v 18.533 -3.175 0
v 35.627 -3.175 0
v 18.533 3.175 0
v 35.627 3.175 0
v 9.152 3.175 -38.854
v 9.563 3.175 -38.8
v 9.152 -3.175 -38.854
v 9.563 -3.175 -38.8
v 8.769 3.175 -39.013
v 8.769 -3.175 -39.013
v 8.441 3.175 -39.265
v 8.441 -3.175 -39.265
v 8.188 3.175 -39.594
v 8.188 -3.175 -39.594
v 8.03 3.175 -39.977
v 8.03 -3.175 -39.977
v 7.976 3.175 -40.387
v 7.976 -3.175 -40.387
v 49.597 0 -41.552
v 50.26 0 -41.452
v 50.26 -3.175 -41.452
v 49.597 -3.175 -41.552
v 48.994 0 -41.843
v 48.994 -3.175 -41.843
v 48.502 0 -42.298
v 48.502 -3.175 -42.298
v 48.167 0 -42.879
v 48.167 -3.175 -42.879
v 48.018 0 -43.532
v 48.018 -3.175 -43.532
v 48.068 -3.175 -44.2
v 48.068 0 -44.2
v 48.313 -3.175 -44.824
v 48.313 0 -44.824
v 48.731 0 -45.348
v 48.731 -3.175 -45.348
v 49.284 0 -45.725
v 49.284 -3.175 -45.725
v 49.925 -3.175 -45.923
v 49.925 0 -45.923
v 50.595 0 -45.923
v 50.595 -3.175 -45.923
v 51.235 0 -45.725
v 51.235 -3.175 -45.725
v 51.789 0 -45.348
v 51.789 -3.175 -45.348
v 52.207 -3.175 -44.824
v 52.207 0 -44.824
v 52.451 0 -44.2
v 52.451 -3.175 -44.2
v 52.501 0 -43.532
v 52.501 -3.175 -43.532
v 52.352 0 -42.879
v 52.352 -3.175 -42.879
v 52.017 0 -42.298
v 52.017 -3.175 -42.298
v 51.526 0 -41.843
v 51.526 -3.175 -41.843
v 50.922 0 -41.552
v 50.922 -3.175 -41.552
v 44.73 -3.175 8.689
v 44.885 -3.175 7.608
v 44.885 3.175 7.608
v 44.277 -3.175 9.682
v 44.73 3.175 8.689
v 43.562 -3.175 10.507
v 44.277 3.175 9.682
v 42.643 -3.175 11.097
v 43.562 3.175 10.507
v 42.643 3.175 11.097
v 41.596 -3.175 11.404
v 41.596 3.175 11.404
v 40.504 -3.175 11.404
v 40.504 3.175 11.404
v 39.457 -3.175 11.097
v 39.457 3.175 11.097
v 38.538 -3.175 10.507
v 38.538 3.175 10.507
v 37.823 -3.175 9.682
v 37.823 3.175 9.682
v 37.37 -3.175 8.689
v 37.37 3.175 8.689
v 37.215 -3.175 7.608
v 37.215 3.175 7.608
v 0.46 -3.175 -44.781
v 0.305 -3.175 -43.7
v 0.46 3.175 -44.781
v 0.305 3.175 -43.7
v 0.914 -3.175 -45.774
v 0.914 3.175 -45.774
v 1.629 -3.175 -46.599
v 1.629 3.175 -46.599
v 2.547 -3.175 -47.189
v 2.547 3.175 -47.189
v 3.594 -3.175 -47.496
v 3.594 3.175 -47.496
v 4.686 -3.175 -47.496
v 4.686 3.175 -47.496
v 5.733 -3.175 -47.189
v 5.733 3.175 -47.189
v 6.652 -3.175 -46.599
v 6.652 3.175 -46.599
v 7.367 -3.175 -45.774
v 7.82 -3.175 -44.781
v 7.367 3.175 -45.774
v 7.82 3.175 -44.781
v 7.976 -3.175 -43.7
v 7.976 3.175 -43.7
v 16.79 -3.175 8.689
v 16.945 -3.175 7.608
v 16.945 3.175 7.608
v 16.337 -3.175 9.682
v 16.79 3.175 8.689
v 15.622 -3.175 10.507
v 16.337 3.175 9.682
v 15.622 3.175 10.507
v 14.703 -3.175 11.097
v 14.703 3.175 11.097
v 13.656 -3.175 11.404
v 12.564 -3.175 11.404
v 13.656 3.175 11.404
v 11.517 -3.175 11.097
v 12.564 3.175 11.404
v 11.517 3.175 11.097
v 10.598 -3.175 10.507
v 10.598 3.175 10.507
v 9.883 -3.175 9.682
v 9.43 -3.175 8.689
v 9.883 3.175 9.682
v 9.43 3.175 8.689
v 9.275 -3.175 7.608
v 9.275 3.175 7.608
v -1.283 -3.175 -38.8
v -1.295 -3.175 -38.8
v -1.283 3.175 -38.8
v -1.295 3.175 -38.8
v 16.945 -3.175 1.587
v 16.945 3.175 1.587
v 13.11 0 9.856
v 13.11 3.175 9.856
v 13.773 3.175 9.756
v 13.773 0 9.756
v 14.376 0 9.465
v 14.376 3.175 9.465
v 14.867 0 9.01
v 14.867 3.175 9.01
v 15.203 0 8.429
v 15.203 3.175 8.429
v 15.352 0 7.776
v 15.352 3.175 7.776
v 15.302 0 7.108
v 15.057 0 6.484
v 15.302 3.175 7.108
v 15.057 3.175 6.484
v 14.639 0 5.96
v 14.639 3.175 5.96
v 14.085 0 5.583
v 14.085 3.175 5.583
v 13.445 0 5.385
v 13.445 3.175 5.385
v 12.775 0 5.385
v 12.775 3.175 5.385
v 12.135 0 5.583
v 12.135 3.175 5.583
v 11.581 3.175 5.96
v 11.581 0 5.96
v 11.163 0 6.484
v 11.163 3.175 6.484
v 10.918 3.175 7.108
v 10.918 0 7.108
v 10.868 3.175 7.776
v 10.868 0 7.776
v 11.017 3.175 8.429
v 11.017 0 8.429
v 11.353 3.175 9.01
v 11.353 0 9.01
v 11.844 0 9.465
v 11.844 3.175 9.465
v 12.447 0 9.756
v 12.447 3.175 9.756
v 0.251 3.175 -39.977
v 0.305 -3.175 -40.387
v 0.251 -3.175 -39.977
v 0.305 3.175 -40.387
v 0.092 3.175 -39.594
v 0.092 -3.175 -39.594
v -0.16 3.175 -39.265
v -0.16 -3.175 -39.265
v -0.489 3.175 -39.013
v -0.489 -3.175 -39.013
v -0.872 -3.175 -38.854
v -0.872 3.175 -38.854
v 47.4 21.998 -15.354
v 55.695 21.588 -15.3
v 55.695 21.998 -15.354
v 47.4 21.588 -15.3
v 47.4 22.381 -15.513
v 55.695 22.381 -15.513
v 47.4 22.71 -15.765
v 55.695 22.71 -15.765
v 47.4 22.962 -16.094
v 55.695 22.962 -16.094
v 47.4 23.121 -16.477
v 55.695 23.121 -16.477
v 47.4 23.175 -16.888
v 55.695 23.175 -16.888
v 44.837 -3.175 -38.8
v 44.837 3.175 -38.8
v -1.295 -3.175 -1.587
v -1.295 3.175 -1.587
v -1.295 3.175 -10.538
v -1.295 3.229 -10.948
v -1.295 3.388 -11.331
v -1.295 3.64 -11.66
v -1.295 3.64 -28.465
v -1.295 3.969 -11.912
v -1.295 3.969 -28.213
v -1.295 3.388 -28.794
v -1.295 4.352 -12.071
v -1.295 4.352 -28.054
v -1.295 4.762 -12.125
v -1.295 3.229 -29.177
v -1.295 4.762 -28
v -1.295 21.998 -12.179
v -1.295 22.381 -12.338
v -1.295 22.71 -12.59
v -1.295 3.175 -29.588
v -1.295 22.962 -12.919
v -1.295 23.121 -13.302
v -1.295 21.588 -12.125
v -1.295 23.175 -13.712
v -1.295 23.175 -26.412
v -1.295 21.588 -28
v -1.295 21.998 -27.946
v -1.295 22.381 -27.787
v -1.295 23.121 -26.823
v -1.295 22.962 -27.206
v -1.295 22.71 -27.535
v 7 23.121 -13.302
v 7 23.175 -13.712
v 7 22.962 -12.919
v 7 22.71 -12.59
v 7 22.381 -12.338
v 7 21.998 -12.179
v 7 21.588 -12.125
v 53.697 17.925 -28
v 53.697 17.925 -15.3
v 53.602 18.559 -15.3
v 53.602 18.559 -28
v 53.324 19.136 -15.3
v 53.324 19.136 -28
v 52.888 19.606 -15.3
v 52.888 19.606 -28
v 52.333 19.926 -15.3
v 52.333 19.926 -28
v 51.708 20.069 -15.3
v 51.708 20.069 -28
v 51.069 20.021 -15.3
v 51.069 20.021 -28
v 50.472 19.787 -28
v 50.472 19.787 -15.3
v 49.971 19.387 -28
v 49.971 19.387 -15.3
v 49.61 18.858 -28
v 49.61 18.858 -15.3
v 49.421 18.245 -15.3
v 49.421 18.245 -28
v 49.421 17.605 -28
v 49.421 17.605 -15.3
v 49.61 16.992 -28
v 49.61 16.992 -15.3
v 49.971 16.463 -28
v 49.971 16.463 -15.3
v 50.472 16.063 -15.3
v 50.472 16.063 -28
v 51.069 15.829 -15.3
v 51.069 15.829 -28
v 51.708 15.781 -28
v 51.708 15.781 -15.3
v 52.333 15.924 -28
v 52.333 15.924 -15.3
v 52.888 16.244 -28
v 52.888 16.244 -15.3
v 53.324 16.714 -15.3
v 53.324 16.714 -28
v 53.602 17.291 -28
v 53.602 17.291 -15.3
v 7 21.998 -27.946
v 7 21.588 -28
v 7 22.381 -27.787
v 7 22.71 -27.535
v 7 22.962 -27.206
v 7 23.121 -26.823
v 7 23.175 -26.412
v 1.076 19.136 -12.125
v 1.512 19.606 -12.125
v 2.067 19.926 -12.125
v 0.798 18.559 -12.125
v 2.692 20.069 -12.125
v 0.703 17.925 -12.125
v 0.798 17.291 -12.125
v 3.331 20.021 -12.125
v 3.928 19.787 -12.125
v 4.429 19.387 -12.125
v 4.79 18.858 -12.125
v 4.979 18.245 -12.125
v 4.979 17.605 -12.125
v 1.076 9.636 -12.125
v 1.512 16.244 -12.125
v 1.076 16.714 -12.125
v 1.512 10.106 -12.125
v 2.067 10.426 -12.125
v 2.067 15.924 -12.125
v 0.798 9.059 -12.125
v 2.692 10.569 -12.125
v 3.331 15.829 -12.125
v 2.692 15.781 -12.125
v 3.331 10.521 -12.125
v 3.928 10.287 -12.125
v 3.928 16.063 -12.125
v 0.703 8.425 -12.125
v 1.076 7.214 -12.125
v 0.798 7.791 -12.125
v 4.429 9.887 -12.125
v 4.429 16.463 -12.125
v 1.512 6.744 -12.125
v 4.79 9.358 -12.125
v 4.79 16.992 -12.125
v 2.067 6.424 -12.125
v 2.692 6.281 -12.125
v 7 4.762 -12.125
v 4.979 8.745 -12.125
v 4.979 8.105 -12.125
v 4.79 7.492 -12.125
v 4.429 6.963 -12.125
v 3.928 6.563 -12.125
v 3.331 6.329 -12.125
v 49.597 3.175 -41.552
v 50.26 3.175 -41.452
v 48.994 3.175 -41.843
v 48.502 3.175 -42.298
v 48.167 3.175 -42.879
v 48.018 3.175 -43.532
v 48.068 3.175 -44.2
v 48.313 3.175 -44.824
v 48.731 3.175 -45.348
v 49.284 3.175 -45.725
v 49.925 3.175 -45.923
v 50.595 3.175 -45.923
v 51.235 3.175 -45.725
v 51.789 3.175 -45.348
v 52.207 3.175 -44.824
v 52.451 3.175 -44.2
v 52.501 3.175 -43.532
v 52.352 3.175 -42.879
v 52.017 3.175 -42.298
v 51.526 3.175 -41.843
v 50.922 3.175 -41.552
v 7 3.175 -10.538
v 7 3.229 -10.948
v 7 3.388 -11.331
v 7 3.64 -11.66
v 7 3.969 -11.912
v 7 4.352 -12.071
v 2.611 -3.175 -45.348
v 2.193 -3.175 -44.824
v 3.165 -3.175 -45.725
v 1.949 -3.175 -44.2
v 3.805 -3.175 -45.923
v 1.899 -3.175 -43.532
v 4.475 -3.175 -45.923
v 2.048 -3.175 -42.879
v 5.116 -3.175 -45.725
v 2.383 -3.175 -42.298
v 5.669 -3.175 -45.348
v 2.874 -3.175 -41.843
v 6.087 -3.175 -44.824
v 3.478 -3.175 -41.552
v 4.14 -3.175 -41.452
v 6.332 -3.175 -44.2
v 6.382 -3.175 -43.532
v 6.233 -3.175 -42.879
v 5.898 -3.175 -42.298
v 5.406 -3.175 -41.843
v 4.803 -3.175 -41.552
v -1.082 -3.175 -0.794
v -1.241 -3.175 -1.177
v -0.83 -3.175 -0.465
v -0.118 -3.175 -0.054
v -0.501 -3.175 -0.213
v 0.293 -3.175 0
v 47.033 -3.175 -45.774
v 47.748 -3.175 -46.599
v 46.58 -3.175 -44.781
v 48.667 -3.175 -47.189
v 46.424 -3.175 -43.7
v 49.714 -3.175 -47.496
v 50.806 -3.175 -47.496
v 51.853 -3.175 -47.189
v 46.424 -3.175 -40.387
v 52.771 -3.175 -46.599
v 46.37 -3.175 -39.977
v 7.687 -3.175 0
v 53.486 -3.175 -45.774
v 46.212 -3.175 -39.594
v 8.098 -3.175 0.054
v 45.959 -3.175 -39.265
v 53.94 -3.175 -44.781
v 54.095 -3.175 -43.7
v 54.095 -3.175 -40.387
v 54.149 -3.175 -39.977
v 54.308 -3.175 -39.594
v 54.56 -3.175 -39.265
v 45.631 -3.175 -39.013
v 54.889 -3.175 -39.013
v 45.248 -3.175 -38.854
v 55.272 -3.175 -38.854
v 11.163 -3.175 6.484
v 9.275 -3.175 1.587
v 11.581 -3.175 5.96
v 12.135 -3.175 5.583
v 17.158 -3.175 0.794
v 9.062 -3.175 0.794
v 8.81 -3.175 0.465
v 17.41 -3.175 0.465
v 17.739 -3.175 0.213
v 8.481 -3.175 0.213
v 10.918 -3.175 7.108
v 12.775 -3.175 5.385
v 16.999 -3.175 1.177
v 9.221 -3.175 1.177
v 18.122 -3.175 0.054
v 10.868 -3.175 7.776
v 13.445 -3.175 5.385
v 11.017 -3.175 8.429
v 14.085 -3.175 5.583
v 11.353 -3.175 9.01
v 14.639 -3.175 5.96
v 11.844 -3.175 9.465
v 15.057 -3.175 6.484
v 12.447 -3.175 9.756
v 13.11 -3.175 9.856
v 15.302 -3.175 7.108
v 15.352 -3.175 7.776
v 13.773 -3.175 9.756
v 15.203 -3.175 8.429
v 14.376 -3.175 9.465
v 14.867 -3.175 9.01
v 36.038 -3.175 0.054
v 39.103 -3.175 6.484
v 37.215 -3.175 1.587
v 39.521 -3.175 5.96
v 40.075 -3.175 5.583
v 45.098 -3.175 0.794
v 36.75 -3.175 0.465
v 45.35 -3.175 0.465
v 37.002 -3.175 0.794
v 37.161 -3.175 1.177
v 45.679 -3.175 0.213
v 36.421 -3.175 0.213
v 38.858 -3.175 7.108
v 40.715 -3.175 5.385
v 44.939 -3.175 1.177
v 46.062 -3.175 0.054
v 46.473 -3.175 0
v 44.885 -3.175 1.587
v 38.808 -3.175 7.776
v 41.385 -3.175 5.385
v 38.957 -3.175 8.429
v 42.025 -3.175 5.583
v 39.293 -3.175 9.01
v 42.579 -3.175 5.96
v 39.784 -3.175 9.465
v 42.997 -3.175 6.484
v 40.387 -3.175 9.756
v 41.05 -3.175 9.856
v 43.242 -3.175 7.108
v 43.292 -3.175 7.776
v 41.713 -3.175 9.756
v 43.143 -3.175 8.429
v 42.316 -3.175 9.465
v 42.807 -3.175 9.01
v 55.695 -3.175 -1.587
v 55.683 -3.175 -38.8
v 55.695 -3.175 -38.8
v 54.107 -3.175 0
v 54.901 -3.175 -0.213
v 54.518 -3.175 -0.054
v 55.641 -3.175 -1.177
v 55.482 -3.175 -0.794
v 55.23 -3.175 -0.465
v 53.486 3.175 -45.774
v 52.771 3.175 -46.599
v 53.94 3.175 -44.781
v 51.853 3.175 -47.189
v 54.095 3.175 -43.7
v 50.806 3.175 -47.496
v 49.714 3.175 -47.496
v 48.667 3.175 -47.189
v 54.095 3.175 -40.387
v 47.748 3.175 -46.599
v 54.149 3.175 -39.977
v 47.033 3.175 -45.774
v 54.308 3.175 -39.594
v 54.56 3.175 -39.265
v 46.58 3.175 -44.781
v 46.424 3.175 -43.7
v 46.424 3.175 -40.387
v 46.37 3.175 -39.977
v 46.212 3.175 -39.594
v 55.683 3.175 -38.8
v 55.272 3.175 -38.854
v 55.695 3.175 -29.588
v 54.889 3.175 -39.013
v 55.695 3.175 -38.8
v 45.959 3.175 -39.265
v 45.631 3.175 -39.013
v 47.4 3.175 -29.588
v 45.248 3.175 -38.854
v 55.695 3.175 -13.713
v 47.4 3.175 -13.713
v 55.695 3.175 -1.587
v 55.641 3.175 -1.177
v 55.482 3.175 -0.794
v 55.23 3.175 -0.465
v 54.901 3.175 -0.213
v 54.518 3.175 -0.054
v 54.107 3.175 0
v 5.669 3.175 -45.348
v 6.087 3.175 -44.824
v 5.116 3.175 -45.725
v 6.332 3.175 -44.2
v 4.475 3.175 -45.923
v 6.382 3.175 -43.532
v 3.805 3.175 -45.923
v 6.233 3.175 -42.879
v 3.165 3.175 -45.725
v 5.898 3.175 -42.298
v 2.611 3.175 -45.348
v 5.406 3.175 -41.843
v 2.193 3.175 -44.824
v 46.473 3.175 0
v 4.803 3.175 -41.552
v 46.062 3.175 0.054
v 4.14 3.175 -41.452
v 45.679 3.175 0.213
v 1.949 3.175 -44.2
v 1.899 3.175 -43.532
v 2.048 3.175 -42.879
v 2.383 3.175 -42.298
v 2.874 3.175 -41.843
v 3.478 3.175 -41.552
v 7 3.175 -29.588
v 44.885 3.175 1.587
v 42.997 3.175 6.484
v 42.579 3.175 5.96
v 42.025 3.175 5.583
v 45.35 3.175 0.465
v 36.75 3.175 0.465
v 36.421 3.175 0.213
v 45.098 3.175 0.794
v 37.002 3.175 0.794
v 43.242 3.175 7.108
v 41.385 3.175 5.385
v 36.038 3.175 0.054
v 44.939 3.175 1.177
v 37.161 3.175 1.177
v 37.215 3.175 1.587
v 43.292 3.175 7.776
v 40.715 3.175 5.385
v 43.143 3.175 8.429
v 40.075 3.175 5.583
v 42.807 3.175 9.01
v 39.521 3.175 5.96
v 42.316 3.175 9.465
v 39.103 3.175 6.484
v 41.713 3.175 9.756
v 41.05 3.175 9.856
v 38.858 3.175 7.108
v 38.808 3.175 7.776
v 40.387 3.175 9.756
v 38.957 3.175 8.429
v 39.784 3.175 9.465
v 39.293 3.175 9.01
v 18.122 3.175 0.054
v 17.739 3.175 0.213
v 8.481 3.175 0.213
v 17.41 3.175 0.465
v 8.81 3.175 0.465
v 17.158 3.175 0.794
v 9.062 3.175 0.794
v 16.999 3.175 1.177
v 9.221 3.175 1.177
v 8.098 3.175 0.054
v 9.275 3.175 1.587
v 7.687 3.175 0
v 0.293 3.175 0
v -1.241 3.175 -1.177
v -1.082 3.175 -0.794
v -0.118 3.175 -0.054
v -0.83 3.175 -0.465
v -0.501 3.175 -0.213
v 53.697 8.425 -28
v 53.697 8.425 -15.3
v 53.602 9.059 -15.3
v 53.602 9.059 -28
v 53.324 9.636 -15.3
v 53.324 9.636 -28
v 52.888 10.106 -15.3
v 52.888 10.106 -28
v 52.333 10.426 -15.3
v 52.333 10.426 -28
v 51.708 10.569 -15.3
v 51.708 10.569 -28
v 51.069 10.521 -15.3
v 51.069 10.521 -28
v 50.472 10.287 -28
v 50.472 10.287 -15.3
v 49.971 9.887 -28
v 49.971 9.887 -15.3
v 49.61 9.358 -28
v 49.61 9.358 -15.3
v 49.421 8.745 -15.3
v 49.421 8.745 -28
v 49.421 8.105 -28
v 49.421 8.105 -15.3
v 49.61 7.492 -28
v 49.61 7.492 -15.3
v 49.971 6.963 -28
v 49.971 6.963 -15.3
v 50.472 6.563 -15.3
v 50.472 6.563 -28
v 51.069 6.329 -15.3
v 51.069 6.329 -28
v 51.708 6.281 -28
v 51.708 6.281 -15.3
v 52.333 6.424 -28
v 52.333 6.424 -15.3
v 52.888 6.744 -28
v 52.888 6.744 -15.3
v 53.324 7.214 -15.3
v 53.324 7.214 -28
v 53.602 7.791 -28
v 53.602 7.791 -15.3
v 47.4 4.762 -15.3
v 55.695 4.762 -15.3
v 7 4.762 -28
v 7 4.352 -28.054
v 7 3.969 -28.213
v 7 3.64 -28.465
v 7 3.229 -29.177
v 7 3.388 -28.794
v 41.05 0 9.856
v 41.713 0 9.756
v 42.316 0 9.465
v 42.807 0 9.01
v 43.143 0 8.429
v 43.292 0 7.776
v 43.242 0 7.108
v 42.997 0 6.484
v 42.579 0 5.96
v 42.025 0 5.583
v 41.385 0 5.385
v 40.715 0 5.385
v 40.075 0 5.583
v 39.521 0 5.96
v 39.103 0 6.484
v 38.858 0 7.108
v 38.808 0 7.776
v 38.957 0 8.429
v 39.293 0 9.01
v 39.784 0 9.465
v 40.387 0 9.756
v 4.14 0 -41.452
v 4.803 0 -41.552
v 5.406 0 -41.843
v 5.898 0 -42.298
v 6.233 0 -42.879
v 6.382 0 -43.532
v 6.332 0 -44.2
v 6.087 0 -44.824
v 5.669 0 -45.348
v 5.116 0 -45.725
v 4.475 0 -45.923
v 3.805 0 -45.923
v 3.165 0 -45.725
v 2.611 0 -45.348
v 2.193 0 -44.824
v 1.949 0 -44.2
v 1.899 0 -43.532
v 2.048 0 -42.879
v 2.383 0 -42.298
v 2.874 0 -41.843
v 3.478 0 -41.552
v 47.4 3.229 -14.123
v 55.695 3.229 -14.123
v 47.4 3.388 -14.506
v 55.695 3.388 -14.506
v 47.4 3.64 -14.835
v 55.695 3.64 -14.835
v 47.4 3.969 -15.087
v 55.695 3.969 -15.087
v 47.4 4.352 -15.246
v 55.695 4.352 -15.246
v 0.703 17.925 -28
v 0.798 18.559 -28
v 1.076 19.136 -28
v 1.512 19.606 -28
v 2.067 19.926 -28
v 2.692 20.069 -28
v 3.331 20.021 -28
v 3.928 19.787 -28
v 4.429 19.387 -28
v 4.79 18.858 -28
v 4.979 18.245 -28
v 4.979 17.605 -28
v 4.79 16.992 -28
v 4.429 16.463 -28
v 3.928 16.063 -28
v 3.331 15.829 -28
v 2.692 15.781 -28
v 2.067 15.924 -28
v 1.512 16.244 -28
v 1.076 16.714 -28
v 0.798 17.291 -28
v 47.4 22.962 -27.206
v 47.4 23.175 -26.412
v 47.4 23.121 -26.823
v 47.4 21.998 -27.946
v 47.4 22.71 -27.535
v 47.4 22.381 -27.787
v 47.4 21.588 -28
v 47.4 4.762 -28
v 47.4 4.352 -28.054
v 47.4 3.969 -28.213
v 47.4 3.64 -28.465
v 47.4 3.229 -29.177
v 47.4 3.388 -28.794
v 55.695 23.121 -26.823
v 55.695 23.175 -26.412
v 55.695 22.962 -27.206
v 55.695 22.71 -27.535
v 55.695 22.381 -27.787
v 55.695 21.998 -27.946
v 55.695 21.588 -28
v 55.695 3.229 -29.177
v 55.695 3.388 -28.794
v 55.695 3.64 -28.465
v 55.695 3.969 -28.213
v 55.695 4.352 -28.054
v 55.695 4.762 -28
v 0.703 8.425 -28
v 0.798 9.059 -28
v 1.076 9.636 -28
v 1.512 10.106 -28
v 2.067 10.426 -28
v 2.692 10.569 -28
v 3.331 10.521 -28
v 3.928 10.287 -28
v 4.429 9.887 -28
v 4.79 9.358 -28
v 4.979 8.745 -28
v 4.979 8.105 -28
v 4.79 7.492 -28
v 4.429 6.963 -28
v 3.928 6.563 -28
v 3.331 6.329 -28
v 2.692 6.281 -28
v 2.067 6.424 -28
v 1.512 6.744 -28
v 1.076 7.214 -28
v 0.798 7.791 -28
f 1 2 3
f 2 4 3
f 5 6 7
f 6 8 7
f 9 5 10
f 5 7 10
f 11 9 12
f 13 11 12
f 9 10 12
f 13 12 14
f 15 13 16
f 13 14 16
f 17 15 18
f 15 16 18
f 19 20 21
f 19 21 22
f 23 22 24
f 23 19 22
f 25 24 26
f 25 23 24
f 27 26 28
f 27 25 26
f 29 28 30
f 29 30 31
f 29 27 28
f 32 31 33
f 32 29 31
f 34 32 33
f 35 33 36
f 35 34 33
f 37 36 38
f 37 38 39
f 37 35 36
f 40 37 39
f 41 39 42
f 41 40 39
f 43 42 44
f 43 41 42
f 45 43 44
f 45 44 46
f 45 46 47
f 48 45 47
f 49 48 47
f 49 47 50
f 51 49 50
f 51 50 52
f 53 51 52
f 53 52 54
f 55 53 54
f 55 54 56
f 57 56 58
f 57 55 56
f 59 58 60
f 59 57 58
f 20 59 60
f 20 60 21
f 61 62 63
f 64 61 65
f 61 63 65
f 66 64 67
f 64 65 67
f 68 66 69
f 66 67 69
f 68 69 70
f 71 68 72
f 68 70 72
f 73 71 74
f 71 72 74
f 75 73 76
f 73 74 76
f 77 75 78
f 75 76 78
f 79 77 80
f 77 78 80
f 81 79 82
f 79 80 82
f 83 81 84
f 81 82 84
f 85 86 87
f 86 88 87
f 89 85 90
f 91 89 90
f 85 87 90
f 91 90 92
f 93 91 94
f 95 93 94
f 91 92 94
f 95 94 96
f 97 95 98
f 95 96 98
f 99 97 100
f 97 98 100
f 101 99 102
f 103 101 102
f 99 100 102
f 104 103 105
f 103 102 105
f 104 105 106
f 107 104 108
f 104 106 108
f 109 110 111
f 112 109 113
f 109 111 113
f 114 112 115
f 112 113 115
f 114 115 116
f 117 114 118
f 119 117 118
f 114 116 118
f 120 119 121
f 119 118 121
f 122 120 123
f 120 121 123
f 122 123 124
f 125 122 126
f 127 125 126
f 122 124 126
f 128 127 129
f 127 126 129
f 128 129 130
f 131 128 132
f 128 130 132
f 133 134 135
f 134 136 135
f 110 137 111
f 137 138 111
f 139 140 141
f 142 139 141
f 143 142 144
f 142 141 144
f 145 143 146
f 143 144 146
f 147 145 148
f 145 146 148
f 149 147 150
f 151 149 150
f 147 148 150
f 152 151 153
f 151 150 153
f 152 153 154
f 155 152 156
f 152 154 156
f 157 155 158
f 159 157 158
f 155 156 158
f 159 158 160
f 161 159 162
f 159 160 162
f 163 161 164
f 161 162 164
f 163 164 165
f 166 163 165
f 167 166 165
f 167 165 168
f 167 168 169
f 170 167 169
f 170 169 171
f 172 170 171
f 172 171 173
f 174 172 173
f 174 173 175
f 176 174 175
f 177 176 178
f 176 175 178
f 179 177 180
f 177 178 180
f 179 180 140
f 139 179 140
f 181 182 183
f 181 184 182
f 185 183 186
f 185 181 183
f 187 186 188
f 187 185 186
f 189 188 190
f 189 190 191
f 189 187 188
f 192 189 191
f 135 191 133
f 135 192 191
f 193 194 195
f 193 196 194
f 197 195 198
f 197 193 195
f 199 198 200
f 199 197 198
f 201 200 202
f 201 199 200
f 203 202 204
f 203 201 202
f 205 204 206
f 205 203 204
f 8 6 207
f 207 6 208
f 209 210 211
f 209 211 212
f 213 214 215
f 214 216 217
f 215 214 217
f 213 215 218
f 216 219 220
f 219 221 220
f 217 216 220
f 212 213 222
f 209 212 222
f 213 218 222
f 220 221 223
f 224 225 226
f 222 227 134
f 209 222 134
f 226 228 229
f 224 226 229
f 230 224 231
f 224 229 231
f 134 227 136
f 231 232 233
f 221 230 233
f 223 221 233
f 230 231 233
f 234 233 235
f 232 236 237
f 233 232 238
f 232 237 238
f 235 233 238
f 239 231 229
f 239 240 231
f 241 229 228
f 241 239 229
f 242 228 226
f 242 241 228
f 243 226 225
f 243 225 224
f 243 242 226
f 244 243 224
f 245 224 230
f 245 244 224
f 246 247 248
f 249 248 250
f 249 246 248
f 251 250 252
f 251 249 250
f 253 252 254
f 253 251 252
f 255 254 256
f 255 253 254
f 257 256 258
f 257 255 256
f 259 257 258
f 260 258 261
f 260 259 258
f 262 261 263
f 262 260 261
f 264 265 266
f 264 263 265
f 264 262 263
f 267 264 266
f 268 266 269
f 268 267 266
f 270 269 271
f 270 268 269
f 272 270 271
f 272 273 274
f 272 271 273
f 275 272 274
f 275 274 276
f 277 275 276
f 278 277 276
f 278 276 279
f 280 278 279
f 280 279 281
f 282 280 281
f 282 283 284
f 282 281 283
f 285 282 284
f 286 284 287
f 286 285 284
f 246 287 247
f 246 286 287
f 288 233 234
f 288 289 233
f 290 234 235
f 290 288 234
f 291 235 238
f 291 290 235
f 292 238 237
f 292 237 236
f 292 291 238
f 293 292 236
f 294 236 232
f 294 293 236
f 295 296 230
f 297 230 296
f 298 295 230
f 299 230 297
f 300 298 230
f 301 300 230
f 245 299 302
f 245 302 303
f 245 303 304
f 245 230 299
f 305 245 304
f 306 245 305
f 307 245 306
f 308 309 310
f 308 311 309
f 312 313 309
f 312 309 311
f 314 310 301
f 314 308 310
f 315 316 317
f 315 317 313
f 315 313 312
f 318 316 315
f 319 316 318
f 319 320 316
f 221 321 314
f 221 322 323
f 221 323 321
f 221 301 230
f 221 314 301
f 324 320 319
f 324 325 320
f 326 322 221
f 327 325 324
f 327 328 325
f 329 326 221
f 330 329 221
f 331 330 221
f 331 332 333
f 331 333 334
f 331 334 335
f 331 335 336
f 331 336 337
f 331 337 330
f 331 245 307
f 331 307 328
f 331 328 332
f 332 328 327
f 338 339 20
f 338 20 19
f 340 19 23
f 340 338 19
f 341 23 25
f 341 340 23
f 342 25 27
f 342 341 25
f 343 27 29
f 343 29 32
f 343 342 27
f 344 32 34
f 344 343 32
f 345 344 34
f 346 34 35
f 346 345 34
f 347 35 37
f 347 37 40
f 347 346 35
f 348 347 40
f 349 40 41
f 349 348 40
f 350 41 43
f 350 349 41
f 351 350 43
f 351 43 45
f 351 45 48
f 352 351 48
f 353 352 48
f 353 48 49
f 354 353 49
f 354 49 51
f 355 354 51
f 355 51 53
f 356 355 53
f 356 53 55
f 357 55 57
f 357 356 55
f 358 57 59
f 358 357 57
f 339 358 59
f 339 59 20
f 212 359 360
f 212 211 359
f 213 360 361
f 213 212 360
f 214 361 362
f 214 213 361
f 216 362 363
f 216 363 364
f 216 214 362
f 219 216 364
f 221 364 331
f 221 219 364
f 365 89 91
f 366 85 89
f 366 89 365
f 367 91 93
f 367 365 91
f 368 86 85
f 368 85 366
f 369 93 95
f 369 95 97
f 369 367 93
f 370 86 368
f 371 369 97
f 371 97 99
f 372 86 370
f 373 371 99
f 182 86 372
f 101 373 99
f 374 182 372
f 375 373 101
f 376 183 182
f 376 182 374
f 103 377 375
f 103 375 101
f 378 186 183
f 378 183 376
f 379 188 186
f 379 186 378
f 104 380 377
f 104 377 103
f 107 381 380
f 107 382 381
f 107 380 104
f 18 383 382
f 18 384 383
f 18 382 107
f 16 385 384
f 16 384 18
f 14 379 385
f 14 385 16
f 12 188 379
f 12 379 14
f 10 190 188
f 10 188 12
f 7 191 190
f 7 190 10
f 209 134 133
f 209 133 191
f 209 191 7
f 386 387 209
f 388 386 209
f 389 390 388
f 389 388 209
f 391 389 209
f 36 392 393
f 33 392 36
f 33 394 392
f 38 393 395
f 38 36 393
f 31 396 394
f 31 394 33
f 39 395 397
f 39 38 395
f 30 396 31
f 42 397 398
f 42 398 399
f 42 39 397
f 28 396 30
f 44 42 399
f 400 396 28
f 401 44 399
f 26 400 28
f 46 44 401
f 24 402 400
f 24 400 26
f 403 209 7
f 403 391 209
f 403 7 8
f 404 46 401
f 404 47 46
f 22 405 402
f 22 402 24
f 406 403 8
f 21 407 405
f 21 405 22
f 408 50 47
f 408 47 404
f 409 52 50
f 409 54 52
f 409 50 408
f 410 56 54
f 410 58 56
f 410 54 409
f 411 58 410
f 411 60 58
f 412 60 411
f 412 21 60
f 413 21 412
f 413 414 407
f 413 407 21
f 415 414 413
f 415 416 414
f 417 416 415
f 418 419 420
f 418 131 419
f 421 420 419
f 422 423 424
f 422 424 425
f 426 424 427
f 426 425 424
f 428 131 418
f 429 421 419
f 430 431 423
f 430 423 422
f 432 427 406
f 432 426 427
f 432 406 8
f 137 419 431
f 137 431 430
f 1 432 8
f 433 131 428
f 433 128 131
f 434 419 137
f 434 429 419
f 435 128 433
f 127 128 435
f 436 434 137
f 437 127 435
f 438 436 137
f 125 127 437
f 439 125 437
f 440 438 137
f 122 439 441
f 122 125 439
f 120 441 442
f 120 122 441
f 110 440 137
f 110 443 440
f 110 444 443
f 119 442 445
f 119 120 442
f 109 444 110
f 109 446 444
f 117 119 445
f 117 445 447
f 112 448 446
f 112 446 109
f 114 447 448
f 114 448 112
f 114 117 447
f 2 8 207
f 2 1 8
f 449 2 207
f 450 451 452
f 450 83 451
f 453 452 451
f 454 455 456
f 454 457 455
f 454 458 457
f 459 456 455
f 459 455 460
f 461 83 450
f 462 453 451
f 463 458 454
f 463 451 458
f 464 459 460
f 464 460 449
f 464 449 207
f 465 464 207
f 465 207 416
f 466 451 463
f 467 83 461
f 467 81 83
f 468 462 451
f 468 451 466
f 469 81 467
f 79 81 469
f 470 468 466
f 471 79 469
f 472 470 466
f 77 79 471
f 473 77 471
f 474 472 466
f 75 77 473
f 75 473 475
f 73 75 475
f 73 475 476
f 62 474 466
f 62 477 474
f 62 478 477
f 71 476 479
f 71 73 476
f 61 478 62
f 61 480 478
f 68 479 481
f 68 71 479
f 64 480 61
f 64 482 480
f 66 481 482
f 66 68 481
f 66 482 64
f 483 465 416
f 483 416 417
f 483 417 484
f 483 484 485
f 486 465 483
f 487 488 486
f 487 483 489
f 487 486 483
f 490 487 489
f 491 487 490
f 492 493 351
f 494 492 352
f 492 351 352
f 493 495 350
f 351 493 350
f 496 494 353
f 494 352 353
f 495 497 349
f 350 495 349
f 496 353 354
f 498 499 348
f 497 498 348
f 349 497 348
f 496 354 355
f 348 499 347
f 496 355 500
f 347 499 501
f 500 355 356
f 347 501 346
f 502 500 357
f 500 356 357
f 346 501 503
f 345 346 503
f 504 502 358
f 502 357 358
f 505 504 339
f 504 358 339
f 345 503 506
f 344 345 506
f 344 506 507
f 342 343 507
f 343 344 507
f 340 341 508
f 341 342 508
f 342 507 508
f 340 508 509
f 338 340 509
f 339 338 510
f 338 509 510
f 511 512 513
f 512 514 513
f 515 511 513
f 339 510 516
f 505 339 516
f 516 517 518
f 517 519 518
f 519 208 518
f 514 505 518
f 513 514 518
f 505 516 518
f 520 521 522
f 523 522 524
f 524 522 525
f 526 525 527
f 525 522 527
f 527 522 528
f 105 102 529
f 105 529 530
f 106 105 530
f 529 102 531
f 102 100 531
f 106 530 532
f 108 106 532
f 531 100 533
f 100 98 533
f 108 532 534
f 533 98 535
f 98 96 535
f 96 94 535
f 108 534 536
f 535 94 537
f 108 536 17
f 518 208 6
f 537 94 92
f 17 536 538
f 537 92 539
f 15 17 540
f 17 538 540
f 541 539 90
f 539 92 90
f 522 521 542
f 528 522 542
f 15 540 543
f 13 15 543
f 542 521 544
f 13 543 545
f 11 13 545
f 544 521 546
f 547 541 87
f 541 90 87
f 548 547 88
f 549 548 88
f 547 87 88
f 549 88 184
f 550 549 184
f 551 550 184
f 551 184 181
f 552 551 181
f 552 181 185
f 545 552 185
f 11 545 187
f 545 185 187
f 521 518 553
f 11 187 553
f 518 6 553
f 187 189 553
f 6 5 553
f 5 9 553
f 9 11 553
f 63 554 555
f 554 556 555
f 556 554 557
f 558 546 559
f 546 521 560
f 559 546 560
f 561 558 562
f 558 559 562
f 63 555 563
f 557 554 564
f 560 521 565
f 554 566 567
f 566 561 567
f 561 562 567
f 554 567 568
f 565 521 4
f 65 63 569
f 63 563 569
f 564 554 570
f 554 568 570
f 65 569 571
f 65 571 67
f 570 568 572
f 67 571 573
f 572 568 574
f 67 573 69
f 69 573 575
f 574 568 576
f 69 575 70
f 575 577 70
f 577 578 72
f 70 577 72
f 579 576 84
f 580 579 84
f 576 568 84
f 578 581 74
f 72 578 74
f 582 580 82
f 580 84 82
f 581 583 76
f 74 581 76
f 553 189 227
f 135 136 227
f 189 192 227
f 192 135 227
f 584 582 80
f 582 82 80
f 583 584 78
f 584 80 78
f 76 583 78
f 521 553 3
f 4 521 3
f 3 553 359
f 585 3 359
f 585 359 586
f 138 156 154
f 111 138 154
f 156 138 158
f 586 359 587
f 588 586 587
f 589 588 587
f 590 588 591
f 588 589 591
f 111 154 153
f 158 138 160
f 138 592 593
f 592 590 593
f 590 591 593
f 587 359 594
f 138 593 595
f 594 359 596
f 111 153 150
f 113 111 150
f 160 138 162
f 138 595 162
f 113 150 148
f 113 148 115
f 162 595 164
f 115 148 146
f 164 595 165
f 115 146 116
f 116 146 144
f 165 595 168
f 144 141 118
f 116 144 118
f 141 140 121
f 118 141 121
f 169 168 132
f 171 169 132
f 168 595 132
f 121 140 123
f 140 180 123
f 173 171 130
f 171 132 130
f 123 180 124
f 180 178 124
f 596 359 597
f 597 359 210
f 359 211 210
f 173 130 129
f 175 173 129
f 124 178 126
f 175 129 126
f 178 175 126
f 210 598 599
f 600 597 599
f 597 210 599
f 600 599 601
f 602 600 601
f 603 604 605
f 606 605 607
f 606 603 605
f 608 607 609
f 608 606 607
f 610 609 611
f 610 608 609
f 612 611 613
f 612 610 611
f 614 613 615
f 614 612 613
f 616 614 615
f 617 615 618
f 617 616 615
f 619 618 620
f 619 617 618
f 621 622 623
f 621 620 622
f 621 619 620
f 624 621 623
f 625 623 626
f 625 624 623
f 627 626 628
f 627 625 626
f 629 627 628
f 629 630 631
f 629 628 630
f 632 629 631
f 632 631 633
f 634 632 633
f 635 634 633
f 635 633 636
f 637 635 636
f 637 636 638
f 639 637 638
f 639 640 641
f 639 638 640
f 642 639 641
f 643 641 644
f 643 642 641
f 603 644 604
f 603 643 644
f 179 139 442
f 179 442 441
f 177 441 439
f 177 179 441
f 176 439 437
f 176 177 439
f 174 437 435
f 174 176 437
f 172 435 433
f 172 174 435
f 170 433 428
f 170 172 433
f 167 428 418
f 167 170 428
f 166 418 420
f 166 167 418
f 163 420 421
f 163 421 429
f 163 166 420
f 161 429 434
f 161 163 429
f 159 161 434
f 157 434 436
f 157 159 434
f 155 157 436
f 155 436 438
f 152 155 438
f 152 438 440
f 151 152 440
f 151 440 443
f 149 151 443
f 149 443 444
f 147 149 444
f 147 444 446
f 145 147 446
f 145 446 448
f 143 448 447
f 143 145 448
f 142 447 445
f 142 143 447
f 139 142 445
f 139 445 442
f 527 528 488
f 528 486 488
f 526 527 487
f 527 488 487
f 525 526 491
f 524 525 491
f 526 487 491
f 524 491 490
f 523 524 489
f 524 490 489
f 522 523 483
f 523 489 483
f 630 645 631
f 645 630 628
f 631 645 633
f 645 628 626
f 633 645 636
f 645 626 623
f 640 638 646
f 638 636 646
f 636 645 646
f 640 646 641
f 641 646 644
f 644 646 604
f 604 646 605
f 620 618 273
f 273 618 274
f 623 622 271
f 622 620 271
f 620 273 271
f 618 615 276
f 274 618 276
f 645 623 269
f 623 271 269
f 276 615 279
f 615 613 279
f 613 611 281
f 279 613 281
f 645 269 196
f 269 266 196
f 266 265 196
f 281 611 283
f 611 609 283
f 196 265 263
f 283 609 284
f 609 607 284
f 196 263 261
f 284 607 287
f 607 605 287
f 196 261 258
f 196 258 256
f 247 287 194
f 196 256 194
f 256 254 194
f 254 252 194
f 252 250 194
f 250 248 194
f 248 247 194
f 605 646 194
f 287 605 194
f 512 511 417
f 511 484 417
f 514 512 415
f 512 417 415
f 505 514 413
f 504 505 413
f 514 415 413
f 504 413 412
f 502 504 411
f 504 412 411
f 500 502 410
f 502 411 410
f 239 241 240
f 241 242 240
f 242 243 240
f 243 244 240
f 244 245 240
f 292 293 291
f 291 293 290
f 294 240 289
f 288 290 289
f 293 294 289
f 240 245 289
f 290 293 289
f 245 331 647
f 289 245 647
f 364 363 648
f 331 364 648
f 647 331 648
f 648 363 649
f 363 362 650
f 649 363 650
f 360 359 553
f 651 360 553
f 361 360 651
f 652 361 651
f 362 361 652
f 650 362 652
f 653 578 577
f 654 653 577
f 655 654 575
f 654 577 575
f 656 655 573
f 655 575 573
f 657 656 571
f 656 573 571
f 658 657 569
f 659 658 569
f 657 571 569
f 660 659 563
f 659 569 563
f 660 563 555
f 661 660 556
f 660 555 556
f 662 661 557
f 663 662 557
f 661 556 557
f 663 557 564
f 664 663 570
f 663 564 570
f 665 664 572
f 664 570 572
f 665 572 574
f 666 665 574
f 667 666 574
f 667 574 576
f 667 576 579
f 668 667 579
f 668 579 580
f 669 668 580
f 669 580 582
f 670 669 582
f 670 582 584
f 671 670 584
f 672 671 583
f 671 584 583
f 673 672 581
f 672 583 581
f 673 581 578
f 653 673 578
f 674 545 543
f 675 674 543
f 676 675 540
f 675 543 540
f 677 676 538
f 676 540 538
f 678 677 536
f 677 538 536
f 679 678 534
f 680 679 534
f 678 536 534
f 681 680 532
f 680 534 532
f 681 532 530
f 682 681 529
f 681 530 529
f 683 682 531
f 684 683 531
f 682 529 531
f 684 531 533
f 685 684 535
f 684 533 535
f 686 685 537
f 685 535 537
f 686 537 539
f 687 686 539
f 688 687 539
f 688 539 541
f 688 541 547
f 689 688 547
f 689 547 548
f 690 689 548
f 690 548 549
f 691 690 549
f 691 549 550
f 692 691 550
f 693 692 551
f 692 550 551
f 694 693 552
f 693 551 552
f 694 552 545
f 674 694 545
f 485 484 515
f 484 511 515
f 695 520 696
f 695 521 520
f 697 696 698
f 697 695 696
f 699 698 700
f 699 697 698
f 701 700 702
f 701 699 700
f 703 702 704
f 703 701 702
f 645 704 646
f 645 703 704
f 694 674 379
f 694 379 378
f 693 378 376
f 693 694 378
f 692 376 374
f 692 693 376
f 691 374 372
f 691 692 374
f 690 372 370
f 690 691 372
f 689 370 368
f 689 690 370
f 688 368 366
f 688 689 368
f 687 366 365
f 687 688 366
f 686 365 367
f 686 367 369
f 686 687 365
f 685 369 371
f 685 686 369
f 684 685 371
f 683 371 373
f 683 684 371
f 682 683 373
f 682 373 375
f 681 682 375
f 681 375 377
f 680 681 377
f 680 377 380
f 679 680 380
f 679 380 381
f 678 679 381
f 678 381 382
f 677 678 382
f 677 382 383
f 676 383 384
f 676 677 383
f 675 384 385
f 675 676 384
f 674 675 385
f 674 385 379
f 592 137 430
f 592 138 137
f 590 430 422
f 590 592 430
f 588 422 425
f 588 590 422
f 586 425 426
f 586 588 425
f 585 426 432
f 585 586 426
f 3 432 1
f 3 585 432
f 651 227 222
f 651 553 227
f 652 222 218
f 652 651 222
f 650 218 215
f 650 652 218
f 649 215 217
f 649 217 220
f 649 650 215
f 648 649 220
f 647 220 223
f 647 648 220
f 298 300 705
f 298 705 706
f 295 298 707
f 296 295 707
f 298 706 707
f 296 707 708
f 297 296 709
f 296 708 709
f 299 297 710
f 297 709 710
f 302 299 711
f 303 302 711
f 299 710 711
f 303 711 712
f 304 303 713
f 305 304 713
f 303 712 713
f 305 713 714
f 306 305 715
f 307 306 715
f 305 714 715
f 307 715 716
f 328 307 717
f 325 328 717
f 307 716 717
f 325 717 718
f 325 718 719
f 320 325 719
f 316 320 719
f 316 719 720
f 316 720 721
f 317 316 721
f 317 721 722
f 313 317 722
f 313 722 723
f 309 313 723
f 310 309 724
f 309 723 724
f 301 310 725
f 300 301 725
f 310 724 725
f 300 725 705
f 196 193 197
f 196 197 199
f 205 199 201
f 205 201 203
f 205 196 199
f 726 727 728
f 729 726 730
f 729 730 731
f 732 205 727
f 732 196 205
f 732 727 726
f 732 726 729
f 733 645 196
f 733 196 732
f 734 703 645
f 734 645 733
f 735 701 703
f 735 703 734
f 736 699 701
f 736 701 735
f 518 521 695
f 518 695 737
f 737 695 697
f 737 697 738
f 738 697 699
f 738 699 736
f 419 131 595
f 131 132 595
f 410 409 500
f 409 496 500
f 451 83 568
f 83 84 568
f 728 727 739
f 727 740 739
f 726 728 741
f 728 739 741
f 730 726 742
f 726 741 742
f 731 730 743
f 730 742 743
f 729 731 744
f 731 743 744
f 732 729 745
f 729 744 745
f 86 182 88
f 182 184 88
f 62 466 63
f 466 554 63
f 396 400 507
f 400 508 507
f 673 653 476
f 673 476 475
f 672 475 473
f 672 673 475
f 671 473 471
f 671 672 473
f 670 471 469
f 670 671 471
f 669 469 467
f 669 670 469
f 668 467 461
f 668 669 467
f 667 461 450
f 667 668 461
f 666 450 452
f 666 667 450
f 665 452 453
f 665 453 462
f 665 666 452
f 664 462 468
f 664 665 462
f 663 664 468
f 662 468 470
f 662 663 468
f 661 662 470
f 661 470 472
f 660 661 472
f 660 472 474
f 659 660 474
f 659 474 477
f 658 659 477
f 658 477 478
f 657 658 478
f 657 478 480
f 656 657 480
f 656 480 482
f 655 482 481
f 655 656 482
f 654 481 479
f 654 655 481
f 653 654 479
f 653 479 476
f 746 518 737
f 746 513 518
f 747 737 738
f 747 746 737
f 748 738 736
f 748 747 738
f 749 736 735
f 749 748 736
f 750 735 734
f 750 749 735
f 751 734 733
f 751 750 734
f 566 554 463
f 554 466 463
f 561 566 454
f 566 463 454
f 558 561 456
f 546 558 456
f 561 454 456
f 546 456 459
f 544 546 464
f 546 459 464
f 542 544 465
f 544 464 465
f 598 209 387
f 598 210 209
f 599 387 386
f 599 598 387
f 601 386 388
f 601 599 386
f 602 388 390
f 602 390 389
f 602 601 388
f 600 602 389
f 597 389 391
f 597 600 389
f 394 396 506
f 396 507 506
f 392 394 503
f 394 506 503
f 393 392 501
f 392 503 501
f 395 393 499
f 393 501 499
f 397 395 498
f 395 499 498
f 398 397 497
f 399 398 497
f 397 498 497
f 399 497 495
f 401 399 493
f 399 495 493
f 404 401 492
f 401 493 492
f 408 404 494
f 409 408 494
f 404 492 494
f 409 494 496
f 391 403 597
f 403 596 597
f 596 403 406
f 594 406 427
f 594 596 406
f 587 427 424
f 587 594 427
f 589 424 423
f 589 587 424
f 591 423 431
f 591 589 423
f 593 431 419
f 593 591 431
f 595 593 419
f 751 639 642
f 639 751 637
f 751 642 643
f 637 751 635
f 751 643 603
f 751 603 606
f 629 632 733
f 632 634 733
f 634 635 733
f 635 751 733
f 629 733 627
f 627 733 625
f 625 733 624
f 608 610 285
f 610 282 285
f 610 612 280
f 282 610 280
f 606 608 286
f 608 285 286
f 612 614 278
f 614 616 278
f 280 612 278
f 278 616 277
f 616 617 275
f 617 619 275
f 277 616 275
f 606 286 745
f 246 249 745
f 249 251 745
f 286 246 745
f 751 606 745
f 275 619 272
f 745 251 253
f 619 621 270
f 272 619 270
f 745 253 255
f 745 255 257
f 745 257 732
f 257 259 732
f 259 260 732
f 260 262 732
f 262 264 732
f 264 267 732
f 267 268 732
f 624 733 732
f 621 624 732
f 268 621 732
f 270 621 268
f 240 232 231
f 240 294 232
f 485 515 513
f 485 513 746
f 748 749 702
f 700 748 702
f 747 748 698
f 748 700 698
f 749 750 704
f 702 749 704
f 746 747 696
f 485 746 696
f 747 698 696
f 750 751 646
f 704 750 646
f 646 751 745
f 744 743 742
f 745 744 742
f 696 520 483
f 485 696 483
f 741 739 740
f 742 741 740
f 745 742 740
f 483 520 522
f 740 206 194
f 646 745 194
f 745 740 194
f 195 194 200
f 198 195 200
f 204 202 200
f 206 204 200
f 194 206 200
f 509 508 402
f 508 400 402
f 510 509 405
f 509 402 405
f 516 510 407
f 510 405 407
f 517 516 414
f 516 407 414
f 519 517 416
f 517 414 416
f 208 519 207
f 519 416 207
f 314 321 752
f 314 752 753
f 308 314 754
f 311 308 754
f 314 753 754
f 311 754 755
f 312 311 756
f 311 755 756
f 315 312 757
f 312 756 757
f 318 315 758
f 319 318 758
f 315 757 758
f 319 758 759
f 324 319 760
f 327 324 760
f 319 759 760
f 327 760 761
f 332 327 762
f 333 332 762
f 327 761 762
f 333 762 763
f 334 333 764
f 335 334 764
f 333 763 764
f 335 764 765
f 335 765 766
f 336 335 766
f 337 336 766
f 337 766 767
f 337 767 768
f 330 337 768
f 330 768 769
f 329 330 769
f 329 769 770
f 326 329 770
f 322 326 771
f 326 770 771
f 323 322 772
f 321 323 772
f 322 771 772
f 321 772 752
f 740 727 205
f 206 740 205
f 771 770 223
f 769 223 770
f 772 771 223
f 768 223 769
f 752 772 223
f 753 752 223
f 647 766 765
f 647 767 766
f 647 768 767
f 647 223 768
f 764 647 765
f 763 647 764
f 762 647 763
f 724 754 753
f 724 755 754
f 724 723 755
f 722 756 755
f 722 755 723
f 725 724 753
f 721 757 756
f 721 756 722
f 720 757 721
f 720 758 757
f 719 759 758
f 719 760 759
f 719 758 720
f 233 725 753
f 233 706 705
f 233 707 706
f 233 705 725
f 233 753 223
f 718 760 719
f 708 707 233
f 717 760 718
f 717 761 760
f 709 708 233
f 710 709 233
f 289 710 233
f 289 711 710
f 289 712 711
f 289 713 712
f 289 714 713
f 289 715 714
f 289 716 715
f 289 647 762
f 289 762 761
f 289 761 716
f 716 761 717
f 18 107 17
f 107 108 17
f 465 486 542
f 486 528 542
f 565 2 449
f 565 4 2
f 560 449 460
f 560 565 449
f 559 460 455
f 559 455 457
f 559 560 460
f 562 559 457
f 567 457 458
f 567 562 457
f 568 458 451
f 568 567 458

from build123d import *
from build123d.topology import SkipClean

# Parameters (mm, degrees)
SKETCH1_W           = 54.4
SKETCH1_H           = 38.8
BOSS_EXTRUDE1_DEPTH = 3.175
SKETCH2_W           = 7
SKETCH2_H           = 15.875
BOSS_EXTRUDE2_DEPTH = 20
SKETCH3_R           = 3.8354
SKETCH3_R_2         = 2.2479
BOSS_EXTRUDE3_DEPTH = 3.175
LPATTERN1_COUNT     = 2
LPATTERN1_PITCH     = 27.94
SKETCH6_R           = 3.8354
SKETCH6_R_2         = 2.2479
BOSS_EXTRUDE6_DEPTH = 3.175
SKETCH7_R           = 2.150000018
CUT_EXTRUDE1_DEPTH  = 15.875
BOSS_EXTRUDE7_DEPTH = 1.2948
SKETCH11_R          = 2.2479
BOSS_EXTRUDE8_DEPTH = 3.175
CUT_EXTRUDE2_REACH  = 79.746
SKETCH13_W          = 3.175
SKETCH13_H          = 20
FILLET1_R           = 1.5875


with BuildPart() as part:
    # Sketch1 → Boss-Extrude1 (new body)
    with BuildSketch(Plane(origin=(0, 0, 0), x_dir=(1, 0, 0), z_dir=(0, 1, 0))):
        with Locations((27.2, 19.4)):
            Rectangle(SKETCH1_W, SKETCH1_H)
    extrude(amount=BOSS_EXTRUDE1_DEPTH)

    # Sketch2 → Boss-Extrude2 (add)
    with BuildSketch(Plane(origin=(0, 3.175, 0), x_dir=(1, 0, 0), z_dir=(0, 1, 0))):
        with Locations((3.5, 20.0625)):
            Rectangle(SKETCH2_W, SKETCH2_H)
    boss_extrude2 = extrude(amount=BOSS_EXTRUDE2_DEPTH)

    # Mirror1: Boss-Extrude2 across plane
    add(boss_extrude2.mirror(Plane.ZY.offset(-27.2)))

    # Sketch3 → Boss-Extrude3 (add)
    # profile 1 of 2: a face of its own
    with BuildSketch(Plane(origin=(0, 3.175, 0), x_dir=(1, 0, 0), z_dir=(0, 1, 0))):
        with Locations((13.109999942, -7.608)):
            Circle(SKETCH3_R)
        with Locations(Location((13.109999942, -7.608, 0), (0, 0, 270))):
            Circle(SKETCH3_R_2, mode=Mode.SUBTRACT)
    # profile 2 of 2: a face of its own
    with BuildSketch(Plane(origin=(0, 3.175, 0), x_dir=(1, 0, 0), z_dir=(0, 1, 0))):
        with BuildLine():
            Line((9.274599942, 0), (9.274599942, -7.608))
            ThreePointArc((9.274599942, -7.608), (13.109999942, -3.7726), (16.945399942, -7.608))
            Line((16.945399942, -7.608), (16.945399942, 0))
            Line((16.945399942, 0), (9.274599942, 0))
        make_face()
    boss_extrude3 = extrude(amount=-BOSS_EXTRUDE3_DEPTH)

    # LPattern1: Boss-Extrude3 ×2
    with Locations(*[(i * LPATTERN1_PITCH, 0, 0) for i in range(1, LPATTERN1_COUNT)]):
        add(boss_extrude3)

    # Sketch6 → Boss-Extrude6 (add)
    # profile 1 of 2: a face of its own
    with BuildSketch(Plane(origin=(0, 3.175, 0), x_dir=(1, 0, 0), z_dir=(0, 1, 0))):
        with Locations((4.1402, 43.7)):
            Circle(SKETCH6_R)
        with Locations(Location((4.1402, 43.7, 0), (0, 0, 270))):
            Circle(SKETCH6_R_2, mode=Mode.SUBTRACT)
    # profile 2 of 2: a face of its own
    with BuildSketch(Plane(origin=(0, 3.175, 0), x_dir=(1, 0, 0), z_dir=(0, 1, 0))):
        with BuildLine():
            ThreePointArc((7.9756, 43.7), (4.1402, 39.8646), (0.3048, 43.7))
            Line((0.3048, 43.7), (0.3048, 38.8))
            Line((0.3048, 38.8), (7.9756, 38.8))
            Line((7.9756, 38.8), (7.9756, 43.7))
        make_face()
    boss_extrude6 = extrude(amount=-BOSS_EXTRUDE6_DEPTH)

    # Mirror3: Boss-Extrude6 across plane
    add(boss_extrude6.mirror(Plane.ZY.offset(-27.2)))

    # Sketch7 → Cut-Extrude1 (cut)
    with BuildSketch(Plane(origin=(0, 0, -28), x_dir=(-1, 0, 0), z_dir=(0, 0, -1))):
        with Locations((-2.852600116, 17.925)):
            Circle(SKETCH7_R)
        with Locations((-2.852600116, 8.425)):
            Circle(SKETCH7_R)
    cut_extrude1 = extrude(amount=-CUT_EXTRUDE1_DEPTH, mode=Mode.SUBTRACT)

    # Sketch9 → Boss-Extrude7 (add)
    with BuildSketch(Plane.ZY):
        Polygon((-38.8, 0), (-38.8, 3.175), (-28, 3.175), (-28, 23.175), (-12.125, 23.175), (-12.125, 3.175), (0, 3.175), (0, 0), align=None)
    boss_extrude7 = extrude(amount=BOSS_EXTRUDE7_DEPTH)

    # Mirror4: Boss-Extrude7 across plane
    add(boss_extrude7.mirror(Plane.ZY.offset(-27.2)))

    # Mirror5: Cut-Extrude1 across plane
    add(cut_extrude1.mirror(Plane.ZY.offset(-27.2)), mode=Mode.SUBTRACT)

    # Sketch11 → Boss-Extrude8 (add)
    with SkipClean():  # the faces are left unmerged after this step: merging them gives an invalid solid
        with BuildSketch(Plane.XZ):
            with BuildLine():
                Line((0.3048, -38.8), (0.3048, -43.7))
                ThreePointArc((0.3048, -43.7), (4.1402, -47.5354), (7.9756, -43.7))
                Line((7.9756, -43.7), (7.9756, -38.8))
                Line((7.9756, -38.8), (46.4244, -38.8))
                Line((46.4244, -38.8), (46.4244, -43.7))
                ThreePointArc((46.4244, -43.7), (50.2598, -47.5354), (54.0952, -43.7))
                Line((54.0952, -43.7), (54.0952, -38.8))
                Line((54.0952, -38.8), (55.6948, -38.8))
                Line((55.6948, -38.8), (55.6948, 0))
                Line((55.6948, 0), (44.885399942, 0))
                Line((44.885399942, 0), (44.885399942, 7.608))
                ThreePointArc((44.885399942, 7.608), (41.049999942, 11.4434), (37.214599942, 7.608))
                Line((37.214599942, 7.608), (37.214599942, 0))
                Line((37.214599942, 0), (16.945399942, 0))
                Line((16.945399942, 0), (16.945399942, 7.608))
                ThreePointArc((16.945399942, 7.608), (13.109999942, 11.4434), (9.274599942, 7.608))
                Line((9.274599942, 7.608), (9.274599942, 0))
                Line((9.274599942, 0), (-1.2948, 0))
                Line((-1.2948, 0), (-1.2948, -38.8))
                Line((-1.2948, -38.8), (0.3048, -38.8))
            make_face()
            with Locations(Location((4.1402, -43.7, 0), (0, 0, 90))):
                Circle(SKETCH11_R, mode=Mode.SUBTRACT)
            with Locations(Location((50.2598, -43.7, 0), (0, 0, 90))):
                Circle(SKETCH11_R, mode=Mode.SUBTRACT)
            with Locations(Location((41.049999942, 7.608, 0), (0, 0, 90))):
                Circle(SKETCH11_R, mode=Mode.SUBTRACT)
            with Locations(Location((13.109999942, 7.608, 0), (0, 0, 90))):
                Circle(SKETCH11_R, mode=Mode.SUBTRACT)
        extrude(amount=BOSS_EXTRUDE8_DEPTH)
    add(part.part.scale(1), mode=Mode.REPLACE)  # the faces are merged on a copy

    # Sketch13 → Cut-Extrude2 (cut, up to next)
    with BuildSketch(Plane(origin=(55.6948, 0, 0), x_dir=(0, 0, -1), z_dir=(1, 0, 0)), mode=Mode.PRIVATE) as cut_extrude2_sk1:
        with Locations((13.7125, 13.175)):
            Rectangle(SKETCH13_W, SKETCH13_H)
    cut_extrude2_tool1 = extrude(cut_extrude2_sk1.sketch, amount=-CUT_EXTRUDE2_REACH, mode=Mode.PRIVATE) & part.part
    add(cut_extrude2_tool1.solids().sort_by_distance((55.6948, 13.175, -13.7125))[0], mode=Mode.SUBTRACT)

    # Fillet1
    fillet1_edges = [part.edges().sort_by_distance(p)[0] for p in [
        (-1.2948, 0, 0),
        (55.6948, 0, 0),
        (2.8526, 3.175, -12.125),
        (2.8526, 3.175, -28),
        (2.8526, 23.175, -12.125),
        (2.8526, 23.175, -28),
        (51.5474, 23.175, -15.3),
        (51.5474, 3.175, -15.3),
        (51.5474, 23.175, -28),
        (51.5474, 3.175, -28),
        (16.945399942, 0, 0),
        (9.274599942, 0, 0),
        (44.885399942, 0, 0),
        (37.214599942, 0, 0),
        (0.3048, 0, -38.8),
        (7.9756, 0, -38.8),
        (46.4244, 0, -38.8),
        (54.0952, 0, -38.8),
    ]]
    fillet(fillet1_edges, radius=FILLET1_R)


solid = part.part
